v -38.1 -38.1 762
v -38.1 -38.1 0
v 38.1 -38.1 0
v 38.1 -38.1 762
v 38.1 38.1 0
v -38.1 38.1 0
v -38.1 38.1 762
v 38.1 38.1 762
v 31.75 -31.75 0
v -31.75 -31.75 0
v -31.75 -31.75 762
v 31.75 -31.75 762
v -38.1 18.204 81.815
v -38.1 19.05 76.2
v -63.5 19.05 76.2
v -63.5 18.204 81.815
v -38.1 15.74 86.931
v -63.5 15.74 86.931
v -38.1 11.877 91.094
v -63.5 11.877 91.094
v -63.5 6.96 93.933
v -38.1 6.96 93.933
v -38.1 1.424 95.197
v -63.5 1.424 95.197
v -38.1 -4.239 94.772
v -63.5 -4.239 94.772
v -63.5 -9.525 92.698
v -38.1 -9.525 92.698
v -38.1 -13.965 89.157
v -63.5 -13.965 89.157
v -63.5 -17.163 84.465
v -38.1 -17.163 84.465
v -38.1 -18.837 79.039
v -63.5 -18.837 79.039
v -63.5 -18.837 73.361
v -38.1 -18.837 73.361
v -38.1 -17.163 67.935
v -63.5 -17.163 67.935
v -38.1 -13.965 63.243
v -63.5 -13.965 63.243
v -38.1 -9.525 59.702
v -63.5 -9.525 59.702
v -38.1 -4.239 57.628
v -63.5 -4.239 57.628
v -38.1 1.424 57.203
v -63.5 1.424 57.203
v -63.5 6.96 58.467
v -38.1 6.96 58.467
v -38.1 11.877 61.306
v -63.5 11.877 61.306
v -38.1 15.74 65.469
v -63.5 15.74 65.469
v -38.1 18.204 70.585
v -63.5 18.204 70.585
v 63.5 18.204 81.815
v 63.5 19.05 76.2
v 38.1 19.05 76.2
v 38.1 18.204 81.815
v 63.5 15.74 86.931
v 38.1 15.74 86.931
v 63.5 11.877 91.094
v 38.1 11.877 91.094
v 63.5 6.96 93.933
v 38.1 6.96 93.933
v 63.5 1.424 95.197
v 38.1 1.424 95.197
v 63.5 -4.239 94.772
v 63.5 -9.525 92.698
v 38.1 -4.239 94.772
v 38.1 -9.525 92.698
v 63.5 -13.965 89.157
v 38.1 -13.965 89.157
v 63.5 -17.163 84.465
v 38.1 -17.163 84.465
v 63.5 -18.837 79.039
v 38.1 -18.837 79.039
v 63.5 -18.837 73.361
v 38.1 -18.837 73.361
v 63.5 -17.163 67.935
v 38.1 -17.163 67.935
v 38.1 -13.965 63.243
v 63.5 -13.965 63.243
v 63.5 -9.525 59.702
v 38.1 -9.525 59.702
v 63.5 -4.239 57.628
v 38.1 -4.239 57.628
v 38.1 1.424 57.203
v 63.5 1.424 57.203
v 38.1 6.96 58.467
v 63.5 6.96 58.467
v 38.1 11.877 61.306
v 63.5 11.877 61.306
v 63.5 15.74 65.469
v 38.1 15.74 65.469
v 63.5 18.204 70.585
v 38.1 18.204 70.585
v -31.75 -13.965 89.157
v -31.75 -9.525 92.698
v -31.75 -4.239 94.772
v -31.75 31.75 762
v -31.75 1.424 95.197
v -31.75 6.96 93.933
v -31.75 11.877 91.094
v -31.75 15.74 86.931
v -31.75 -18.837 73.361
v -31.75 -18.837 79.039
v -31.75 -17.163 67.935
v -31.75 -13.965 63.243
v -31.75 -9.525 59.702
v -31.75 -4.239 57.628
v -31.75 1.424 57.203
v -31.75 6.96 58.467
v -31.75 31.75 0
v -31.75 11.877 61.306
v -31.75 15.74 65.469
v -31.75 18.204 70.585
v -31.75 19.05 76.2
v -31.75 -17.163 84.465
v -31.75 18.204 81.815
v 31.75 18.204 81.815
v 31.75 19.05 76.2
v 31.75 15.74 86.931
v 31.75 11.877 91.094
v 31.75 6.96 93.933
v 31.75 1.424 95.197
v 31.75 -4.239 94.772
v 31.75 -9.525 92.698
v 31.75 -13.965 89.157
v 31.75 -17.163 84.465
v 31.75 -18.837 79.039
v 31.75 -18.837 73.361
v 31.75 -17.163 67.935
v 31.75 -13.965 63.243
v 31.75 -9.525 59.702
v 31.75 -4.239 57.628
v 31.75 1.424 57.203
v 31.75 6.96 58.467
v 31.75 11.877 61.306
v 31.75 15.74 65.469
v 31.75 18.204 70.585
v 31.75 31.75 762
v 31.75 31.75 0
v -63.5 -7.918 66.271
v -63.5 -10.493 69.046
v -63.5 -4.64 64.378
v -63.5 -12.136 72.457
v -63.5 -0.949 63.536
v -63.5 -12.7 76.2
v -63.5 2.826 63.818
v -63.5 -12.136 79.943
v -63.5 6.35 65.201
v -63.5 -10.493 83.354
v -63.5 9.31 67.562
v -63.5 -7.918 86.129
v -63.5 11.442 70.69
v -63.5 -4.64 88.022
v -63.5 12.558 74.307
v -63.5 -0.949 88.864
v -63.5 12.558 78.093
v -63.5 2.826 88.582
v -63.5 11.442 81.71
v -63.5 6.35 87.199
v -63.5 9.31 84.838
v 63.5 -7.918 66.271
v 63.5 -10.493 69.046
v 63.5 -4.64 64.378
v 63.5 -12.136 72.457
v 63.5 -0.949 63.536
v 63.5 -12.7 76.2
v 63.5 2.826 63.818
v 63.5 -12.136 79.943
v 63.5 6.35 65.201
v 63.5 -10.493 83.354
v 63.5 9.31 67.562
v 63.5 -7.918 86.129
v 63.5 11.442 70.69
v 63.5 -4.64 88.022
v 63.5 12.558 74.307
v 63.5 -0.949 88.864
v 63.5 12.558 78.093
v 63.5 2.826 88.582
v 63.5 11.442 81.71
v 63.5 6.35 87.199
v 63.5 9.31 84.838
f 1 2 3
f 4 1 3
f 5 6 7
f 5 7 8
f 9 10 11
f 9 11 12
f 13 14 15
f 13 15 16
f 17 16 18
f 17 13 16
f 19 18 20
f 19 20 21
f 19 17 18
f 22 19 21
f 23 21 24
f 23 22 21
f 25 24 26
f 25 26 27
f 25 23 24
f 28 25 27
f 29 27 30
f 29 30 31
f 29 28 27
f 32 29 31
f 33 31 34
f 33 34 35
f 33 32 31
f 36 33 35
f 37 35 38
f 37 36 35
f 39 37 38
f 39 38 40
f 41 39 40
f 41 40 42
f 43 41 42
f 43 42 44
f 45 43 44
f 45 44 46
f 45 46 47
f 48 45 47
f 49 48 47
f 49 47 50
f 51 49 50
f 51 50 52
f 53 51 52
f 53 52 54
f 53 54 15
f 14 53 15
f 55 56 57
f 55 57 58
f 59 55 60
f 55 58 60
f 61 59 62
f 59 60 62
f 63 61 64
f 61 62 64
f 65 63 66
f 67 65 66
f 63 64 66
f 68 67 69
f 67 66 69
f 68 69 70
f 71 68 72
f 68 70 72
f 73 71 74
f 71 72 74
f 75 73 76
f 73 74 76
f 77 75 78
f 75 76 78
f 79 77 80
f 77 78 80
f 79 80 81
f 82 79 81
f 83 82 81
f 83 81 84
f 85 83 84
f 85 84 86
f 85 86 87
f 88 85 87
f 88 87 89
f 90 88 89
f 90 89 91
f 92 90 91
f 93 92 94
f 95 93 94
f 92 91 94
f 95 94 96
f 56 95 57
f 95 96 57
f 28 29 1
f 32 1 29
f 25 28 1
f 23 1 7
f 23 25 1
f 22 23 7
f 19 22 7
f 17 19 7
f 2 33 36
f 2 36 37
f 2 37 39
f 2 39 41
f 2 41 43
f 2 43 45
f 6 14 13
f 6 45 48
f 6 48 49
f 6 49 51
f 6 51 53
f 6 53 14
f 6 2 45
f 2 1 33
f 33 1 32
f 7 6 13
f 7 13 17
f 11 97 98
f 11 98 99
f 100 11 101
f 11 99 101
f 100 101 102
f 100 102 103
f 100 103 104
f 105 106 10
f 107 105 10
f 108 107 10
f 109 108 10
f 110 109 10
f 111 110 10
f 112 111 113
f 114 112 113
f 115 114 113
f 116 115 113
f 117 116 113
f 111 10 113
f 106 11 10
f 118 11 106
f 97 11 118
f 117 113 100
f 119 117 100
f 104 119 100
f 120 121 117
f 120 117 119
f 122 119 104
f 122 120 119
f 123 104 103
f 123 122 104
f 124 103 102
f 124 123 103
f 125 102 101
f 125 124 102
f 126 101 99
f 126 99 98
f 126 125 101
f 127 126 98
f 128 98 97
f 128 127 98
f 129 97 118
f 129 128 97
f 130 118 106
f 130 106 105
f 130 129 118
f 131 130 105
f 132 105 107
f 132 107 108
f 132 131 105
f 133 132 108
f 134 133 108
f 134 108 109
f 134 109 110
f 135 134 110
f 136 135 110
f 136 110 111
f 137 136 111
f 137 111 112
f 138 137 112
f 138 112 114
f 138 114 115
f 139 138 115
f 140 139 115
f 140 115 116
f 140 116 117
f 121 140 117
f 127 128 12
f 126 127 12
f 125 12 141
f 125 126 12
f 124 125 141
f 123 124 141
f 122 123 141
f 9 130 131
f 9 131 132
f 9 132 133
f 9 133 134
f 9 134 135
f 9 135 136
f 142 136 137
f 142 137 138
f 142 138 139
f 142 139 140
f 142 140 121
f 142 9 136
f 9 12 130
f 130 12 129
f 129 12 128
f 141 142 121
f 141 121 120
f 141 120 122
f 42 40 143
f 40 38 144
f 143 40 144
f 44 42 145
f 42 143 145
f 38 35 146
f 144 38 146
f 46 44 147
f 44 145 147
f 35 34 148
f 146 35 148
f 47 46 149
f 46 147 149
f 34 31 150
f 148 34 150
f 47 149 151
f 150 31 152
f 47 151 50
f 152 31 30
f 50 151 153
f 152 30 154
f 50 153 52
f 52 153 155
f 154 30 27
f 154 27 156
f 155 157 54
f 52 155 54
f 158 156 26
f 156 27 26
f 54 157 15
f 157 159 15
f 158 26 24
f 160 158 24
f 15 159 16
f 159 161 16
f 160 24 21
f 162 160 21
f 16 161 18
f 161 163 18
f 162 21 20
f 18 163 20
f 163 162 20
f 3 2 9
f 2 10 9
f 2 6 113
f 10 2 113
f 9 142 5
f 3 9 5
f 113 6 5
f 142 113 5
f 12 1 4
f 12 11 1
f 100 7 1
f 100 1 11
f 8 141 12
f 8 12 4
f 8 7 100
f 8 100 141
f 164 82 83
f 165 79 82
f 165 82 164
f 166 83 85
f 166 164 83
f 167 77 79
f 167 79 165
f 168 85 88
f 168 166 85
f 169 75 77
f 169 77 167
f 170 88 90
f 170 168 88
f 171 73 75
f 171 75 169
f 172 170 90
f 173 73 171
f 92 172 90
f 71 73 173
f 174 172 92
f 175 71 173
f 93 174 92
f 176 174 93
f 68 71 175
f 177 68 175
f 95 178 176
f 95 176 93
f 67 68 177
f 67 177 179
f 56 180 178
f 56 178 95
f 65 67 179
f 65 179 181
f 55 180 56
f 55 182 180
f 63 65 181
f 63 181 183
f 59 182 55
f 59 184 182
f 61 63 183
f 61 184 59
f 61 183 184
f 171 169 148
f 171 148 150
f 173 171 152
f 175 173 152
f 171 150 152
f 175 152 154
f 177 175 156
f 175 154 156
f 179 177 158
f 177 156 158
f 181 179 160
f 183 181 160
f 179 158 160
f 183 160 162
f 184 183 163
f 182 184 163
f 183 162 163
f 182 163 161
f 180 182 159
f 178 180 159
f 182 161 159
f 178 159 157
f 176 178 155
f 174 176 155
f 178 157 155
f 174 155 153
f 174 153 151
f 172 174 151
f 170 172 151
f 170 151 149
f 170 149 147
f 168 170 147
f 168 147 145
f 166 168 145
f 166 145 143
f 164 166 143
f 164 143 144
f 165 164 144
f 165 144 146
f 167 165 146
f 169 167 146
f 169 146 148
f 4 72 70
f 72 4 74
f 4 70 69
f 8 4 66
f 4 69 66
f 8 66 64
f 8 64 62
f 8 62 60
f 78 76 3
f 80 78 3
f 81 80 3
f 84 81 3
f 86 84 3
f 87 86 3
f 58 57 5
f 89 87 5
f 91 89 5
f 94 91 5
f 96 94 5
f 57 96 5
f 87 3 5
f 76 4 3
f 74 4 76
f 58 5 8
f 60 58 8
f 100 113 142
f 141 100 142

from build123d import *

# Parameters (mm, degrees)
F0_W          = 76.2
F0_H          = 76.2
F0_W_2        = 63.5
F0_H_2        = 63.5
F1_DEPTH      = 762
F2_R          = 19.05
F3_DEPTH      = 25.4
F3_DEPTH_BACK = 101.6
F4_R          = 12.7
F5_DEPTH      = 127.001


with BuildPart() as f1:
    # F0 (on Top) → F1 (new body)
    with BuildSketch(Plane.XY):
        Rectangle(F0_W, F0_H)
        Rectangle(F0_W_2, F0_H_2, mode=Mode.SUBTRACT)
    extrude(amount=F1_DEPTH)

    # F2 (on face) → F3 (join, two sides)
    with BuildSketch(Plane.YZ.offset(38.1)) as f3_sk:
        with Locations((0, 76.2)):
            Circle(F2_R)
    extrude(amount=F3_DEPTH)
    extrude(f3_sk.sketch, amount=-F3_DEPTH_BACK)

    # F4 (on face) → F5 (cut, through all)
    with BuildSketch(Plane(origin=(-63.5, 0, 0), x_dir=(0, -1, 0), z_dir=(-1, 0, 0))):
        with Locations((0, 76.2)):
            Circle(F4_R)
    extrude(amount=-F5_DEPTH, mode=Mode.SUBTRACT)


solid = f1.part
